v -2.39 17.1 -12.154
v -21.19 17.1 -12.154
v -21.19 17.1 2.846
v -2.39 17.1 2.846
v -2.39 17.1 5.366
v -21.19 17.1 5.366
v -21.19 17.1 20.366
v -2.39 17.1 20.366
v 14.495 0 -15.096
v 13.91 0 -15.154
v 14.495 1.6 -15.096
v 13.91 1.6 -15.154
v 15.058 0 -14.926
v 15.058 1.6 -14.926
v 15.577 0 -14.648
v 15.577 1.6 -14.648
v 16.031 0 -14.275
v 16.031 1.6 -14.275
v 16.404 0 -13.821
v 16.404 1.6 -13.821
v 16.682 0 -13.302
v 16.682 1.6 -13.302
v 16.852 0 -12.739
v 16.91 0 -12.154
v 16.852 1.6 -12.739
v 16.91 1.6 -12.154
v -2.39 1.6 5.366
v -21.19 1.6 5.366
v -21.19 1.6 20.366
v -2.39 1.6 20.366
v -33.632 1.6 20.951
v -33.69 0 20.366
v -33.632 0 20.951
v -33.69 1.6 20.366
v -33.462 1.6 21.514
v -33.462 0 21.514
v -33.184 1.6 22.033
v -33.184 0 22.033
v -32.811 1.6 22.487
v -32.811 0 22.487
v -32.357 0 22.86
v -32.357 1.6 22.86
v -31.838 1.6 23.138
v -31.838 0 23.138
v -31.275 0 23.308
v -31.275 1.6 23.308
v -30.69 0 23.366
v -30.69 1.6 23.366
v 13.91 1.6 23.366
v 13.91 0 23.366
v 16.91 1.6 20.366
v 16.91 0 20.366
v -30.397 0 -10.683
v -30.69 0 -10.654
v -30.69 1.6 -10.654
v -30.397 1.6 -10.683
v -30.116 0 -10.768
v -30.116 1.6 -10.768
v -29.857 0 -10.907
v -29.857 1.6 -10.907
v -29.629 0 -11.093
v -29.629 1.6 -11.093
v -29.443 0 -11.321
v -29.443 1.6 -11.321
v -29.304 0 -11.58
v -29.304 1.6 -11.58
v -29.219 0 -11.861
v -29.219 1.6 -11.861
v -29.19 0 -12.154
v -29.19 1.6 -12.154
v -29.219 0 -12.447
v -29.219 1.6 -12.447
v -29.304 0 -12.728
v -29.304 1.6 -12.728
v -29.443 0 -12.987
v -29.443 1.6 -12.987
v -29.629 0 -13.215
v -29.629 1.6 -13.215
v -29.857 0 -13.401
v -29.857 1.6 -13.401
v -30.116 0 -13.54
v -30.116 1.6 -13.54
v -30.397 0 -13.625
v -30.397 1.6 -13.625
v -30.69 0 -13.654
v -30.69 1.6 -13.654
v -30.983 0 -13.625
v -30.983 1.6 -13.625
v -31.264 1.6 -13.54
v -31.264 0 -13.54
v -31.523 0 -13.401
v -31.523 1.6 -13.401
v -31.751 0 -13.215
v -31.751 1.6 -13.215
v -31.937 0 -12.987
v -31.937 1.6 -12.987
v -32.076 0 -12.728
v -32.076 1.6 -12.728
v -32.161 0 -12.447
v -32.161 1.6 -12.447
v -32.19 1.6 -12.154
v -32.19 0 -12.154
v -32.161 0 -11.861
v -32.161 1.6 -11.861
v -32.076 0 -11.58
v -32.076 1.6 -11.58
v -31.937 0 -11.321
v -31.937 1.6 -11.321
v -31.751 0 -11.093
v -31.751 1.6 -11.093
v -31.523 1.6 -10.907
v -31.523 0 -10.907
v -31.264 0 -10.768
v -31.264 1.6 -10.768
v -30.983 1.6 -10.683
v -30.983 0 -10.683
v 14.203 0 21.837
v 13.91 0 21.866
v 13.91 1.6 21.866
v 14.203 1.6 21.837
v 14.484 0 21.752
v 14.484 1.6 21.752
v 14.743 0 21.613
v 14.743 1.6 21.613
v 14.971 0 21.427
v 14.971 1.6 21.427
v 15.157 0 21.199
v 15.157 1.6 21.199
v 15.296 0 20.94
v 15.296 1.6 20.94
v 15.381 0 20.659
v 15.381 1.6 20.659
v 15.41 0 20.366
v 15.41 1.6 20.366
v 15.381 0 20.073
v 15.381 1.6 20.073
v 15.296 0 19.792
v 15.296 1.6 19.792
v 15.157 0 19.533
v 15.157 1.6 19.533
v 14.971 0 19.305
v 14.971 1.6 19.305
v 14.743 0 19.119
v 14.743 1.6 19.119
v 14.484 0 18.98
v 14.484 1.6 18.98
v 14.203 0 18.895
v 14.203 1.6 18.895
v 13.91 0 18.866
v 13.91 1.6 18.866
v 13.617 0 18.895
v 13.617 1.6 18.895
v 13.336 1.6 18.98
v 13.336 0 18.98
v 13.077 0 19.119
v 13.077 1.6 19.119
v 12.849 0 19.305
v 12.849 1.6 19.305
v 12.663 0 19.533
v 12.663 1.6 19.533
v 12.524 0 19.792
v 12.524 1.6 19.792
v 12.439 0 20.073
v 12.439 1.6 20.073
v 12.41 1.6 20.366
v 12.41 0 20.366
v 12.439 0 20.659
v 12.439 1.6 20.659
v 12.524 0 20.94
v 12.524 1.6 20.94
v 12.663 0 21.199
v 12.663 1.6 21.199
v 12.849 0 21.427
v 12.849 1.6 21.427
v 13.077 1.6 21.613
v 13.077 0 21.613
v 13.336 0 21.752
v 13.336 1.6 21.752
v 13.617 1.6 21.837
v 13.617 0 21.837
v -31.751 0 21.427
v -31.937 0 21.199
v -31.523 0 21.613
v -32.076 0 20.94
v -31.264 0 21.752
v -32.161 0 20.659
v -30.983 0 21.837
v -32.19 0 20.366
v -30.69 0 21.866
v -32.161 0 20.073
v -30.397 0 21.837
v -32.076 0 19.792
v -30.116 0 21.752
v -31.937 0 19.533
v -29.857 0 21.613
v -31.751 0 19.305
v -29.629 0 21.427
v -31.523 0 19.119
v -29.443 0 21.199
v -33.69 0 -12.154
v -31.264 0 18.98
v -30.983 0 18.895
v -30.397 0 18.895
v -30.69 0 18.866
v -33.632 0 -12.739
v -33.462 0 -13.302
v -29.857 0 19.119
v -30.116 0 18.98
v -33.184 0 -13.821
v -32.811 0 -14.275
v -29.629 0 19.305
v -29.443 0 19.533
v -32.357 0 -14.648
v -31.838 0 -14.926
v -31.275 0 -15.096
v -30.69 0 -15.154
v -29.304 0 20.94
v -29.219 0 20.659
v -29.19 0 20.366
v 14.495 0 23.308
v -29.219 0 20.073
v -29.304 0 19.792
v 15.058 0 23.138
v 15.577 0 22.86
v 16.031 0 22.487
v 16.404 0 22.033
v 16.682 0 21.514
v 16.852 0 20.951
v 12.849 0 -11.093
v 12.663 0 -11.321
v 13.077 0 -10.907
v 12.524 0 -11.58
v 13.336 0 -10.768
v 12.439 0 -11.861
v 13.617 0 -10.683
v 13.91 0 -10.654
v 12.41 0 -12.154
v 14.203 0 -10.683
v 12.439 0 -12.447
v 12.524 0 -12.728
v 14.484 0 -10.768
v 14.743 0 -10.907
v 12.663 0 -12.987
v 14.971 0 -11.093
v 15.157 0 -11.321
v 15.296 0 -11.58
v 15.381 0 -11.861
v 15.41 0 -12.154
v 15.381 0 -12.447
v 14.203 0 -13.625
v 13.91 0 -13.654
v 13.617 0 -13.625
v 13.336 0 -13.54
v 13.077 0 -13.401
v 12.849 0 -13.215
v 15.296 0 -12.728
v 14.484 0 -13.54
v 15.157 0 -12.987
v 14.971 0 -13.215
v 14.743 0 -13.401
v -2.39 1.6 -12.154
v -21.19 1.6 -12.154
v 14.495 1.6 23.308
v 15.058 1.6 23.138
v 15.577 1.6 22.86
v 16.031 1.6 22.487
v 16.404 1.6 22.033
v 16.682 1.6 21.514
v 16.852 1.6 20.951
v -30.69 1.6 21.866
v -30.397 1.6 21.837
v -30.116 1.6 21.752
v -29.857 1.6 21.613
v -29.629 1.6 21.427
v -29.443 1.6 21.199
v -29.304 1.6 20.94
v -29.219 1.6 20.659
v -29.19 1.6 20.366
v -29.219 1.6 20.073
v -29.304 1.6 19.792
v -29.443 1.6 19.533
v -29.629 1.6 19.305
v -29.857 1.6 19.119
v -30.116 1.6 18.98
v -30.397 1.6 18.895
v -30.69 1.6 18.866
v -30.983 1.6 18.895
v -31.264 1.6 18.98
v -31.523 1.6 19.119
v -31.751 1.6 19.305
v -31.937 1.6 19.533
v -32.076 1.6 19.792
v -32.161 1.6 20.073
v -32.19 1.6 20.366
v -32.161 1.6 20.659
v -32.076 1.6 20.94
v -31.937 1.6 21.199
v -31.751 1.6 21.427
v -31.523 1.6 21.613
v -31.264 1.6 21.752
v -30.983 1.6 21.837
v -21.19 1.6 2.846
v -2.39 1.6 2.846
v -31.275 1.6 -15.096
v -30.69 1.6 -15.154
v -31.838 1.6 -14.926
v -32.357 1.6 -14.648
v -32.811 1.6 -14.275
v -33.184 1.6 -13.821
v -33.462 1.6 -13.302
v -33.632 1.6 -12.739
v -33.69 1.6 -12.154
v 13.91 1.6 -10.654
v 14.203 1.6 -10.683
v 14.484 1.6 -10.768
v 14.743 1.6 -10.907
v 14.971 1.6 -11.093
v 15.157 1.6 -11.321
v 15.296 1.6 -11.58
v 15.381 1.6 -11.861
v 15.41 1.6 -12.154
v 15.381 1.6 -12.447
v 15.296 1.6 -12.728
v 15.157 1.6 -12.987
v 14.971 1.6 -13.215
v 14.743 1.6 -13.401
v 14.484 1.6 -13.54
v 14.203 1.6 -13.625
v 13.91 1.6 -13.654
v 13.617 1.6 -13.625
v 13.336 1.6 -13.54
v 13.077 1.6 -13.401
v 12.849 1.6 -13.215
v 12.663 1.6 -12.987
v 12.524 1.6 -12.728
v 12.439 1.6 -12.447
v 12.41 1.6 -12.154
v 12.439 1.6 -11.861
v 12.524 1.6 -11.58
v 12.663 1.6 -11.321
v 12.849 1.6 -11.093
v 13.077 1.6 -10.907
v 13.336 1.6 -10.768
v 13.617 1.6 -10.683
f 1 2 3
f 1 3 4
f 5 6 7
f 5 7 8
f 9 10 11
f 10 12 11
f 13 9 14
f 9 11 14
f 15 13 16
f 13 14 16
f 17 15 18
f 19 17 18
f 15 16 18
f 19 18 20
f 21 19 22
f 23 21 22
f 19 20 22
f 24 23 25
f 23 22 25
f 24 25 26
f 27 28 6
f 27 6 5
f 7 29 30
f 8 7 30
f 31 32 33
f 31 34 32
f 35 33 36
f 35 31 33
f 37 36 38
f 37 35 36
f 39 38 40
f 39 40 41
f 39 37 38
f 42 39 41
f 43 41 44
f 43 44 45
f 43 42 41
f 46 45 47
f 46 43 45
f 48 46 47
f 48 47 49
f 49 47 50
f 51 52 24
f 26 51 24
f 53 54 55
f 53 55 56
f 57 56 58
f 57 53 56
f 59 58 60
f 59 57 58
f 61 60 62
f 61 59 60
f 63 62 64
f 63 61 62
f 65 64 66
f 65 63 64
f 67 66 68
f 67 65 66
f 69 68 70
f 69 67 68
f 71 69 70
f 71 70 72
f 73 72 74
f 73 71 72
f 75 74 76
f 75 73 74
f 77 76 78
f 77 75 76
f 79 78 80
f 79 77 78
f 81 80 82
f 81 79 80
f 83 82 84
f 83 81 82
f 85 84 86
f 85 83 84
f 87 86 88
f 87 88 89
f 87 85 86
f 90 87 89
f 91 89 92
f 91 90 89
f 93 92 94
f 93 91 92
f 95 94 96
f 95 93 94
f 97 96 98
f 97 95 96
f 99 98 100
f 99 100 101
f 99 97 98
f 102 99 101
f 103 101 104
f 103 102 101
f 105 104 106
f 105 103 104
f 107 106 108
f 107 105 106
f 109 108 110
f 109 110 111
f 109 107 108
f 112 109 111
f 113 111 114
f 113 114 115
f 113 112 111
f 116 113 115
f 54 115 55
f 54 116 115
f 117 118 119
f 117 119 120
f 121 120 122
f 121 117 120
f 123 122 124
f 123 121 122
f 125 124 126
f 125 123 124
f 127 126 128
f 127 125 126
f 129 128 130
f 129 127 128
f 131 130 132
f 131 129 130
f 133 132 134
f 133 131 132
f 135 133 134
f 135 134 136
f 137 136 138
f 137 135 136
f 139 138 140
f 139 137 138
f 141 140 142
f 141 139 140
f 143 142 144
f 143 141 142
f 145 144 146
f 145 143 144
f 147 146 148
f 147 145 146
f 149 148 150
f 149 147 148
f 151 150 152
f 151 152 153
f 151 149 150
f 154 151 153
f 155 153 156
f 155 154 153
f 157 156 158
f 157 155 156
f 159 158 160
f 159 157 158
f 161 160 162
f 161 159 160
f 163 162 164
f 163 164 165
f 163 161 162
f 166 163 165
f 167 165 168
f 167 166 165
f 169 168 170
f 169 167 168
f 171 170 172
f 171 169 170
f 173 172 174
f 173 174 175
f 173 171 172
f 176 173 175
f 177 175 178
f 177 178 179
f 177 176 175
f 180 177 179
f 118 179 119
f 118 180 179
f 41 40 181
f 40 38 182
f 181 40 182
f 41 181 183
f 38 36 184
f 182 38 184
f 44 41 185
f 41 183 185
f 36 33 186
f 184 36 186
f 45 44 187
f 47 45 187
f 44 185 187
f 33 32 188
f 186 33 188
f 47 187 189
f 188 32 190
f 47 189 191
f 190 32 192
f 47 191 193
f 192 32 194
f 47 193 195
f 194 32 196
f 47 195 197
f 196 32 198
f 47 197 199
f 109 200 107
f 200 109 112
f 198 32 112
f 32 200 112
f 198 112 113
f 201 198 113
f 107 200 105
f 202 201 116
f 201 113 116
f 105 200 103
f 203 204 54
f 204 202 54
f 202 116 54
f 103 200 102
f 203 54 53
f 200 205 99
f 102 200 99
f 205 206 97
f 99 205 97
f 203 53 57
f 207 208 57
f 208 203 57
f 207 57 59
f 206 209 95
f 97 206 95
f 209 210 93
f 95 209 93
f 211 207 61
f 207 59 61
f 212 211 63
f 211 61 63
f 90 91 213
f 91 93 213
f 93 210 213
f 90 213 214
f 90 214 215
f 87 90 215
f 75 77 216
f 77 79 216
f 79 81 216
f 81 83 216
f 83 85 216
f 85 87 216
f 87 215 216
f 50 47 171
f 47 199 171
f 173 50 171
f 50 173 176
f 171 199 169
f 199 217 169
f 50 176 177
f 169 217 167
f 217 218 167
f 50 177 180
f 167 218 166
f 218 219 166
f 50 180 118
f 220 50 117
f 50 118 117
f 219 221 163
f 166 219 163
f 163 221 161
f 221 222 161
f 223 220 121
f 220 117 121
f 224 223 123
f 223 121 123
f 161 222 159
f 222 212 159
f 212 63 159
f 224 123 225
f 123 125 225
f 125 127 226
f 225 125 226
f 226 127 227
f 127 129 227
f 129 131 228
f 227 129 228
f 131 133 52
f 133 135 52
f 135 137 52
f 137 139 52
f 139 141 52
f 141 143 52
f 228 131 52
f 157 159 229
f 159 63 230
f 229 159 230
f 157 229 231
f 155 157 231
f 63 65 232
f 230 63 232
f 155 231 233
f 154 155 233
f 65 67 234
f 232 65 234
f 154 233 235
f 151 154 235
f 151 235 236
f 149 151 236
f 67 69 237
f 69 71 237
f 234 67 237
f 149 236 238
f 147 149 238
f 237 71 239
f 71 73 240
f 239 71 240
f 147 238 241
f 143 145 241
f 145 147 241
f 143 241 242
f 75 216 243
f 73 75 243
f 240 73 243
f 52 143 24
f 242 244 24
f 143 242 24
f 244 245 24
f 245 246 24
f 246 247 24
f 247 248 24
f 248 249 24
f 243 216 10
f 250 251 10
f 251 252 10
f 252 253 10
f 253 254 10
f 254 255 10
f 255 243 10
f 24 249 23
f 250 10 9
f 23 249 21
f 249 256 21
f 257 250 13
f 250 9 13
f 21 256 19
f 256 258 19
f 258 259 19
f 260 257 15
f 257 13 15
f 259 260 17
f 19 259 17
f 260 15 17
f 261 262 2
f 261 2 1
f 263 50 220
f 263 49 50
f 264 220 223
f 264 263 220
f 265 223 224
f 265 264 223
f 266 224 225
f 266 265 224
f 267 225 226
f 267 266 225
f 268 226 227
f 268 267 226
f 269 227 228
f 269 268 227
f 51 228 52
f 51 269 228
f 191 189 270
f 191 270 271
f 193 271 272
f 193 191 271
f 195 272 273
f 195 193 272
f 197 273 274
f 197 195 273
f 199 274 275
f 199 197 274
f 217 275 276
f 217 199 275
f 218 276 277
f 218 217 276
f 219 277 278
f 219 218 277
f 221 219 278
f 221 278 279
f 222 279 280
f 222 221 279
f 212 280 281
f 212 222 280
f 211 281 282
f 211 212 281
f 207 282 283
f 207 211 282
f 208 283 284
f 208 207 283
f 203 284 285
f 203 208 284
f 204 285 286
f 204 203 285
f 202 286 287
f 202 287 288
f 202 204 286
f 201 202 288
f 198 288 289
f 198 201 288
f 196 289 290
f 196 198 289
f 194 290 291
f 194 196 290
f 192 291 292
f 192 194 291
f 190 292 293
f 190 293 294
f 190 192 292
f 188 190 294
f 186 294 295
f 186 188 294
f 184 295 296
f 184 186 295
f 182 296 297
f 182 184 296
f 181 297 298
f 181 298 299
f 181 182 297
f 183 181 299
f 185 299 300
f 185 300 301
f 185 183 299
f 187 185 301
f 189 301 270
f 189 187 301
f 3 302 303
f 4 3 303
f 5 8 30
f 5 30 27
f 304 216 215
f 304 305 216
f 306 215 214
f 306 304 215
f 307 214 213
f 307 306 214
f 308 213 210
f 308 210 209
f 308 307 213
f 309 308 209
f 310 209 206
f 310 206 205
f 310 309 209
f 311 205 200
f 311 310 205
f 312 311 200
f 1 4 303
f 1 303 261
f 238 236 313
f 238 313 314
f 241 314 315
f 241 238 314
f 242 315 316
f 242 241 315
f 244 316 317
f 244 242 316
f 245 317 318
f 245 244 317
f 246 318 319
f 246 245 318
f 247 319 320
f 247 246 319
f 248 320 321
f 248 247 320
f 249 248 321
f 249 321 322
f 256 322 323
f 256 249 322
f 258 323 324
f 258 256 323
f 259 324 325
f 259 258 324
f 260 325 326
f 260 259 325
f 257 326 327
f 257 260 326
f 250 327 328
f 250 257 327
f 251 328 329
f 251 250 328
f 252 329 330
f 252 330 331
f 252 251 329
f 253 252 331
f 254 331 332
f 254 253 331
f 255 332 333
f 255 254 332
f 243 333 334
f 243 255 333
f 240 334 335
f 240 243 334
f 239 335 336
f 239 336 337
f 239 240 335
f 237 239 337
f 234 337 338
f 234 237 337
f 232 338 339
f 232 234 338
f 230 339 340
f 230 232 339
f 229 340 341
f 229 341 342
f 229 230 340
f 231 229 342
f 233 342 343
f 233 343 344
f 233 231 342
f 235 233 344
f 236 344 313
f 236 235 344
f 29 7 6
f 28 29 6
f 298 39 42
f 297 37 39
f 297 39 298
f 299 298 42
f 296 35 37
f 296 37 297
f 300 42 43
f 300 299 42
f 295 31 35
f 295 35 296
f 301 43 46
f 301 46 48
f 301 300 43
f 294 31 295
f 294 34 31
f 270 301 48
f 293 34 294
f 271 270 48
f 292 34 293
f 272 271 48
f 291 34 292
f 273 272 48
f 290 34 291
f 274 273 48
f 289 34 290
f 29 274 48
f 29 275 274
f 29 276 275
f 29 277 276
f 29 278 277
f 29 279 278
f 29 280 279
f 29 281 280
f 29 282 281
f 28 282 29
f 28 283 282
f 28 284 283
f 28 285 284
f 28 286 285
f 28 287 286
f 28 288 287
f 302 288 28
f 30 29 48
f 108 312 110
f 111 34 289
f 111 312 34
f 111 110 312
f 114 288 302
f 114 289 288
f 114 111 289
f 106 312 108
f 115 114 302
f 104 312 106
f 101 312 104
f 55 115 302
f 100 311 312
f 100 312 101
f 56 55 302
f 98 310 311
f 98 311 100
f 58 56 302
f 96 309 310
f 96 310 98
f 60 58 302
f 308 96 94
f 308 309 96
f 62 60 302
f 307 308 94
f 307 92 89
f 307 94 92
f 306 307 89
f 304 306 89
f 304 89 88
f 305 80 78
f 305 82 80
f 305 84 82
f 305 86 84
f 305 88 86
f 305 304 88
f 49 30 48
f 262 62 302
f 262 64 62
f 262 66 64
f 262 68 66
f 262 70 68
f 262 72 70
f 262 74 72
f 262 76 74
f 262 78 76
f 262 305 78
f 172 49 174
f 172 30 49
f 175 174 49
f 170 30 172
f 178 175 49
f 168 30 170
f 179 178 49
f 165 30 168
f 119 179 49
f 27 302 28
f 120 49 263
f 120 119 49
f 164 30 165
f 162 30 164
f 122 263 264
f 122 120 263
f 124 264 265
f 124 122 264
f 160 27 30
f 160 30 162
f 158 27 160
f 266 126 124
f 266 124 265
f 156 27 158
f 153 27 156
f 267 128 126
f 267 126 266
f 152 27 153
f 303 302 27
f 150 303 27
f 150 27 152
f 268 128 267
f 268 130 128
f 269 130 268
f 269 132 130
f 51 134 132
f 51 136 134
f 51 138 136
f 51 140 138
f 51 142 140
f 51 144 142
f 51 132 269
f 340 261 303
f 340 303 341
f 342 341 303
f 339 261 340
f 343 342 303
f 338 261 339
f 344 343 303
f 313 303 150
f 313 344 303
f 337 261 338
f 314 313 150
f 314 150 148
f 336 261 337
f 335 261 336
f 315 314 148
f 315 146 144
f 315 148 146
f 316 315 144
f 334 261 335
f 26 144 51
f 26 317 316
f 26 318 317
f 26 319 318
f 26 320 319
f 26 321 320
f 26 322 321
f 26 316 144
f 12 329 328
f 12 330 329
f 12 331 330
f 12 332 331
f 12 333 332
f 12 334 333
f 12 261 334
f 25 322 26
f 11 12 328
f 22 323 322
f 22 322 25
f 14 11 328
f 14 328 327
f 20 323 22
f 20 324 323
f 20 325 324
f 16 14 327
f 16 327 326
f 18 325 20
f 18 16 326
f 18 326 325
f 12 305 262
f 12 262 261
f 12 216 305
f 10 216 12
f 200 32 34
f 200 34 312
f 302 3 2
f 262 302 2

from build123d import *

# Parameters (mm, degrees)
SKETCH1_W           = 50.6
SKETCH1_H           = 38.52
SKETCH1_R           = 1.5
BOSS_EXTRUDE1_DEPTH = 1.6
FILLET1_R           = 3
FILLET2_R           = 3
FILLET3_R           = 3
FILLET4_R           = 3
SKETCH2_W           = 18.8
SKETCH2_H           = 15
BOSS_EXTRUDE2_DEPTH = 15.5


with BuildPart() as part:
    # Sketch1 → Boss-Extrude1 (new body)
    with BuildSketch(Plane(origin=(0, 0, 0), x_dir=(1, 0, 0), z_dir=(0, 1, 0))):
        with Locations((-8.389974293, -4.106015424)):
            Rectangle(SKETCH1_W, SKETCH1_H)
        with Locations(Location((13.910025707, 12.153984576, 0), (0, 0, 270))):
            Circle(SKETCH1_R, mode=Mode.SUBTRACT)
        with Locations(Location((13.910025707, -20.366015424, 0), (0, 0, 270))):
            Circle(SKETCH1_R, mode=Mode.SUBTRACT)
        with Locations(Location((-30.689974293, -20.366015424, 0), (0, 0, 270))):
            Circle(SKETCH1_R, mode=Mode.SUBTRACT)
        with Locations(Location((-30.689974293, 12.153984576, 0), (0, 0, 270))):
            Circle(SKETCH1_R, mode=Mode.SUBTRACT)
    extrude(amount=BOSS_EXTRUDE1_DEPTH)

    # Fillet1
    fillet1_edges = [part.edges().sort_by_distance(p)[0] for p in [
        (16.910025707, 0.8, -15.153984576),
    ]]
    fillet(fillet1_edges, radius=FILLET1_R)

    # Fillet2
    fillet2_edges = [part.edges().sort_by_distance(p)[0] for p in [
        (-33.689974293, 0.8, -15.153984576),
    ]]
    fillet(fillet2_edges, radius=FILLET2_R)

    # Fillet3
    fillet3_edges = [part.edges().sort_by_distance(p)[0] for p in [
        (-33.689974293, 0.8, 23.366015424),
    ]]
    fillet(fillet3_edges, radius=FILLET3_R)

    # Fillet4
    fillet4_edges = [part.edges().sort_by_distance(p)[0] for p in [
        (16.910025707, 0.8, 23.366015424),
    ]]
    fillet(fillet4_edges, radius=FILLET4_R)

    # Sketch2 → Boss-Extrude2 (add)
    with BuildSketch(Plane(origin=(0, 1.6, 0), x_dir=(1, 0, 0), z_dir=(0, 1, 0))):
        with Locations((-11.789974293, 4.653984576)):
            Rectangle(SKETCH2_W, SKETCH2_H)
        with Locations((-11.789974293, -12.866015424)):
            Rectangle(SKETCH2_W, SKETCH2_H)
    extrude(amount=BOSS_EXTRUDE2_DEPTH)


solid = part.part
